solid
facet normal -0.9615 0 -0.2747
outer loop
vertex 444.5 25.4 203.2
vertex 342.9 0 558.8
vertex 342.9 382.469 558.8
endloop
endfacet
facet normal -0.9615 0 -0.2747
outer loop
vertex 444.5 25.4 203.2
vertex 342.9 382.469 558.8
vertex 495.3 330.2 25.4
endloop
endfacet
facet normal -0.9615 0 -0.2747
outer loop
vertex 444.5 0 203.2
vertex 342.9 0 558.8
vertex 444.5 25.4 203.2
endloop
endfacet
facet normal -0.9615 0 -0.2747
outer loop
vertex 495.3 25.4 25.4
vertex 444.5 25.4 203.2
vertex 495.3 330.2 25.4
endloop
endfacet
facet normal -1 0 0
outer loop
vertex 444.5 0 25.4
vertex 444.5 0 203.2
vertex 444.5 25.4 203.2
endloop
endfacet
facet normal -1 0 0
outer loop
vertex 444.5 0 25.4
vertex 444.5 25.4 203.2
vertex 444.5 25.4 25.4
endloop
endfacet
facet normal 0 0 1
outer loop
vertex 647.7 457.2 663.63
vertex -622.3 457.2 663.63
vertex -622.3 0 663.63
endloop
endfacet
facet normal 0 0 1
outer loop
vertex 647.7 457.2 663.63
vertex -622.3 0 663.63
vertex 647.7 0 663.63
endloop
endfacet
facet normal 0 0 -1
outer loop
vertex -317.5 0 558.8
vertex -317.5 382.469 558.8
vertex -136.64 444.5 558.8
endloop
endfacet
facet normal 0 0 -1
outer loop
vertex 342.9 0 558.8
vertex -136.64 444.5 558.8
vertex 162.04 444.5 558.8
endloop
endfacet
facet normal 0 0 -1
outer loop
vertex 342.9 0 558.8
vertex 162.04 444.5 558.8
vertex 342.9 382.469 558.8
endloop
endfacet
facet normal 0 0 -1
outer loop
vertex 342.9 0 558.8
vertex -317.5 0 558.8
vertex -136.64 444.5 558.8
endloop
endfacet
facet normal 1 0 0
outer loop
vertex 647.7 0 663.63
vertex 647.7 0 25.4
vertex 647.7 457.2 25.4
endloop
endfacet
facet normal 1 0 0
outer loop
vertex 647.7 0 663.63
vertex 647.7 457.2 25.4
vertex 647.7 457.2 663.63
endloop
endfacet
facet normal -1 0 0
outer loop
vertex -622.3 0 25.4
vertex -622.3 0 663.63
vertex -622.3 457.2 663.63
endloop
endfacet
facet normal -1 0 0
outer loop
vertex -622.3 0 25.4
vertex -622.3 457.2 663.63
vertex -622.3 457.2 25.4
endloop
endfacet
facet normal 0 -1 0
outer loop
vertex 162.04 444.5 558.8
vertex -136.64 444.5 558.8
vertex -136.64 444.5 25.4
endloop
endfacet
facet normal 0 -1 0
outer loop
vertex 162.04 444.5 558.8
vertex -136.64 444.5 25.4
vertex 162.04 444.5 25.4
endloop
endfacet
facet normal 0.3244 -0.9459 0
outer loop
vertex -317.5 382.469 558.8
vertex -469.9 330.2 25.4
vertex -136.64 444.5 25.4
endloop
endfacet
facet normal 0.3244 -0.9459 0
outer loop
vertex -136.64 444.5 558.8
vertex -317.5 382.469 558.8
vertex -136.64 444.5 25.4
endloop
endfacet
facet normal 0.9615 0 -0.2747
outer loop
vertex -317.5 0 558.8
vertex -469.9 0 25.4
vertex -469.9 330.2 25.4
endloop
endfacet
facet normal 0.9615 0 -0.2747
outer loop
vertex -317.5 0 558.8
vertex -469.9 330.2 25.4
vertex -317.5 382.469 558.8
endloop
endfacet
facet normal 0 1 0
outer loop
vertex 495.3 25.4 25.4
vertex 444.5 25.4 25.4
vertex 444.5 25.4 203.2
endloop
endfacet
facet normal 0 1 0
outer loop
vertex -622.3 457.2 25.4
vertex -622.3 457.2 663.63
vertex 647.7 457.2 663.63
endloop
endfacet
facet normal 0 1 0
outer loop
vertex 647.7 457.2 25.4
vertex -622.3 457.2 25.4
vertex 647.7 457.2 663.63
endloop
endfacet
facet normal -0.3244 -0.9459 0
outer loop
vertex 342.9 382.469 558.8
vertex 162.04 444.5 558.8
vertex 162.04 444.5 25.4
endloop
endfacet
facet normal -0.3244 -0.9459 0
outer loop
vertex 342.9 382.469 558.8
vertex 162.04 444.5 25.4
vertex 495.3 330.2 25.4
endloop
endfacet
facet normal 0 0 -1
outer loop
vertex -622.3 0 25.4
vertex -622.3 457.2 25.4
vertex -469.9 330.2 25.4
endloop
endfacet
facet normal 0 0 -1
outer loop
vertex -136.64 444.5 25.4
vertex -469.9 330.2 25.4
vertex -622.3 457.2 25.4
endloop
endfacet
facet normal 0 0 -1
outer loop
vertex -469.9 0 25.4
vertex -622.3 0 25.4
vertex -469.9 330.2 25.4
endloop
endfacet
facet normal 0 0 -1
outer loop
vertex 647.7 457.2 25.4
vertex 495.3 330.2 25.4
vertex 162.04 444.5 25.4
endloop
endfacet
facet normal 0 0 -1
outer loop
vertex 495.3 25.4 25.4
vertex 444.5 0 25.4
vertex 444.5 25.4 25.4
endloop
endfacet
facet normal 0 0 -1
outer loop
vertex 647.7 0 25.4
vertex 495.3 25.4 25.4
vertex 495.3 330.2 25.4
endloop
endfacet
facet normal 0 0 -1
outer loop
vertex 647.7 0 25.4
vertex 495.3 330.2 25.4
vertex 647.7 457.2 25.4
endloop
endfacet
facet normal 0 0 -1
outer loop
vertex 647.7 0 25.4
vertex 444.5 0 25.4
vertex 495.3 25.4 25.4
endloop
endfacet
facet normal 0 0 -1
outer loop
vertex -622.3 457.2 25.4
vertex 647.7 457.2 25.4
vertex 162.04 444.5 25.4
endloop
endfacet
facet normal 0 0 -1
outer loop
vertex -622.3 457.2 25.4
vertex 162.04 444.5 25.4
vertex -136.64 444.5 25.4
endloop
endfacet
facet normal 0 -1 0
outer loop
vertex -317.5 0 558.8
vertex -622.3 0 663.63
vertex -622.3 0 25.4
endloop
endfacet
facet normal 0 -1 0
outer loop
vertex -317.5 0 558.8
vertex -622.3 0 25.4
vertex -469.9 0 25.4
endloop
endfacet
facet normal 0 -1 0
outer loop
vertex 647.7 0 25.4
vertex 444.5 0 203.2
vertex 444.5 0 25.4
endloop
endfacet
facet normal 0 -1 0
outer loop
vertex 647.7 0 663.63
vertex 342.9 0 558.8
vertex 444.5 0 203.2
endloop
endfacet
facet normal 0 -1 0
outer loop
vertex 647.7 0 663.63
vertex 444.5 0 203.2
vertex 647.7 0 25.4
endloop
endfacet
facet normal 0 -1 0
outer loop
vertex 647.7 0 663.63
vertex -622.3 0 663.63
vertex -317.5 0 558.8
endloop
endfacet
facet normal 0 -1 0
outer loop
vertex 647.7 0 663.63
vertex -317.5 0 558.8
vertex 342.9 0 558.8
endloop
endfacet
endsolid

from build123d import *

# Parameters (mm, degrees)
F1_DEPTH = 457.2
F3_DEPTH = 25.4
F5_DEPTH = 638.23027


with BuildPart() as f1:
    # F0 (on Front) → F1 (new body)
    with BuildSketch(Plane.XZ):
        Polygon((-622.3, 25.4), (-469.9, 25.4), (-317.5, 558.8), (342.9, 558.8), (495.3, 25.4), (647.7, 25.4), (647.7, 663.63027), (-622.3, 663.63027), align=None)
    extrude(amount=-F1_DEPTH)

    # F2 (on face) → F3 (join)
    with BuildSketch(Plane.XZ):
        Polygon((444.5, 25.4), (495.3, 25.4), (444.5, 203.2), align=None)
    extrude(amount=-F3_DEPTH)

    # F4 (on face) → F5 (join, through all)
    with BuildSketch(Plane.XY.offset(663.63027)):
        Polygon((495.3, 457.2), (-469.9, 457.2), (-469.9, 330.2), (-136.640207, 444.5), (162.040207, 444.5), (495.3, 330.2), align=None)
    extrude(amount=-F5_DEPTH)


solid = f1.part
